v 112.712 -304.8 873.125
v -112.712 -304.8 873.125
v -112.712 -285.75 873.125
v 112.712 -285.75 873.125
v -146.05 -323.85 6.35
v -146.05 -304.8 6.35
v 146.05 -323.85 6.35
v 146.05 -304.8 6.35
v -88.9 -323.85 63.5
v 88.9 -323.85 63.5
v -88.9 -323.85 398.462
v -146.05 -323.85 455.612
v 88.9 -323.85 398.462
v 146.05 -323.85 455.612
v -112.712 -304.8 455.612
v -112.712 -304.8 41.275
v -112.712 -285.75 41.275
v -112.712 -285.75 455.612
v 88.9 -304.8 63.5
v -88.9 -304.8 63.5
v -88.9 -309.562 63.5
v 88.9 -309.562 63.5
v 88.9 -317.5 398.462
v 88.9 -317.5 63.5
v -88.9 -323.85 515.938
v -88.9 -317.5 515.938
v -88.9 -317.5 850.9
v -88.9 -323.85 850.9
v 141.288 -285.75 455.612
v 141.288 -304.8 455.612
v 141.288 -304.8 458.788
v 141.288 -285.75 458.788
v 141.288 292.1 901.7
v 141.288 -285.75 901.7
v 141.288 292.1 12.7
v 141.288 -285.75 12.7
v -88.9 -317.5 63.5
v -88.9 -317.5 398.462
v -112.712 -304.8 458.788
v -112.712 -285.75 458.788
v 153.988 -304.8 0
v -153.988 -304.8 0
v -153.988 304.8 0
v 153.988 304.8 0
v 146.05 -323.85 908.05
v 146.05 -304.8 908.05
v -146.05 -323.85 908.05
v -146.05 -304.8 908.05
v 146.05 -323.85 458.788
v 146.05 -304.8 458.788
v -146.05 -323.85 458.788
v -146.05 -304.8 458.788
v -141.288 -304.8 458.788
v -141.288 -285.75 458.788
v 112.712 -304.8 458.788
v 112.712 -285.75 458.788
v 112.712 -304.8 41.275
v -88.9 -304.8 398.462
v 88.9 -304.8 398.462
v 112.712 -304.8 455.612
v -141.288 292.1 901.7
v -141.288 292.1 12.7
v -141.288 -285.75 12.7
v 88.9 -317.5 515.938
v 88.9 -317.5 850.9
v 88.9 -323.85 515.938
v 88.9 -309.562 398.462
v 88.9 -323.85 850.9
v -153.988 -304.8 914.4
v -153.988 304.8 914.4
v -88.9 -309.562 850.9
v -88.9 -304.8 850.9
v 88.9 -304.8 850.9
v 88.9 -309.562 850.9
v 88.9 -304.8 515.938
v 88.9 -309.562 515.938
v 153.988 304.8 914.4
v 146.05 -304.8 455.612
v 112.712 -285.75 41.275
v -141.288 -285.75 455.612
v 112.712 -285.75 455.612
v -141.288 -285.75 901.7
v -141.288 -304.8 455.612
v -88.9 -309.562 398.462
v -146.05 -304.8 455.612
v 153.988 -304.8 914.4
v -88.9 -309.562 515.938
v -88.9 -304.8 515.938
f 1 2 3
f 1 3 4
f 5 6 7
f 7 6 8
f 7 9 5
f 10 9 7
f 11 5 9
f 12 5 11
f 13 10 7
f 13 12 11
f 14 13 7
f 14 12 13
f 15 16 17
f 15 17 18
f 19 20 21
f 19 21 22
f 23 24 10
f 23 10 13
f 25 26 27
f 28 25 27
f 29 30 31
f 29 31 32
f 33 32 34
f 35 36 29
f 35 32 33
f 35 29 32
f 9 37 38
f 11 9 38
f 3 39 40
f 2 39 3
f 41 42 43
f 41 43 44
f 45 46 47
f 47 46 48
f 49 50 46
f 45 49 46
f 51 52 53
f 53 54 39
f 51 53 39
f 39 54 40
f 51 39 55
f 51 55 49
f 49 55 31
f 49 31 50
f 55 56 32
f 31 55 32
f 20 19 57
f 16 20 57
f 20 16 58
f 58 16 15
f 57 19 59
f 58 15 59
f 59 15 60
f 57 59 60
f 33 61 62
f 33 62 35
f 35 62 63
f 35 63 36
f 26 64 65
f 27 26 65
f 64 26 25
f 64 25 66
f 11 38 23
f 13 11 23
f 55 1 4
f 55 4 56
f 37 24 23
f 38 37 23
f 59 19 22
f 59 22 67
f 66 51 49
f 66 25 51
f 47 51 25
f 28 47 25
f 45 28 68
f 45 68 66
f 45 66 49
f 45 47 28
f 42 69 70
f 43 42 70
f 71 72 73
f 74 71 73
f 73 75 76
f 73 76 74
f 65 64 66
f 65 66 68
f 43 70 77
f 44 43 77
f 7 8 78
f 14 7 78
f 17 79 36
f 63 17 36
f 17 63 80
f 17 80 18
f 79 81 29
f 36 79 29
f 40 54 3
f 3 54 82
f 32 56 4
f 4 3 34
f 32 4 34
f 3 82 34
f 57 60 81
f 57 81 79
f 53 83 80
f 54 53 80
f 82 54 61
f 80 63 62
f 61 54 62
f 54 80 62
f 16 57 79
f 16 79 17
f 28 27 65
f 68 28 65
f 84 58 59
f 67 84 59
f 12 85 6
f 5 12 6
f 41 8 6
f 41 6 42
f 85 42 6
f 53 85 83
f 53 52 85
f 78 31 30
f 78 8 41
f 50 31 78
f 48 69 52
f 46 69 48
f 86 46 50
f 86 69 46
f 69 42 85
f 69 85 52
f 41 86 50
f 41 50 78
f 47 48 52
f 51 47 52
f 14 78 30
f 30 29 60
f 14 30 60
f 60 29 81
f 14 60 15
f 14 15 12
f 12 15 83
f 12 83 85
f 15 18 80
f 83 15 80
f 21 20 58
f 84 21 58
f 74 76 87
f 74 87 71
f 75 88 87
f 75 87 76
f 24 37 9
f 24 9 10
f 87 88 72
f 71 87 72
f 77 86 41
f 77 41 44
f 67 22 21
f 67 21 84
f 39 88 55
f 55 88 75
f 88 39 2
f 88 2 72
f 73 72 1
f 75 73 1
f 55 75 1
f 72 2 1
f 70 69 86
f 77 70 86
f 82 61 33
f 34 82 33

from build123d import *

# Parameters (mm, degrees)
F0_W     = 307.975
F0_H     = 609.6
F1_DEPTH = 914.4
F2_T     = -12.7
F3_W     = 28.575
F3_H     = 19.05
F3_W_2   = 4.7625
F4_DEPTH = 19.05
F3_W_3   = 225.425
F3_H_2   = 395.2875
F3_W_4   = 177.8
F3_H_3   = 334.9625
F5_DEPTH = 19.05
F6_W     = 7.9375
F6_H     = 334.9625
F7_DEPTH = 177.8


with BuildPart() as f1:
    # F0 (on Top) → F1 (new body)
    with BuildSketch(Plane.XY):
        Rectangle(F0_W, F0_H)
    extrude(amount=F1_DEPTH)

    # F2
    f2_openings = [f1.faces().sort_by_distance(p)[0] for p in [
        (0, -304.8, 457.2),
    ]]
    offset(amount=F2_T, openings=f2_openings)

    # F3 (on face) → F4 (join)
    with BuildSketch(Plane.XZ.offset(304.8)):
        Polygon((-141.2875, 901.7), (-141.2875, 477.8375), (-112.7125, 477.8375), (-112.7125, 873.125), (112.7125, 873.125), (112.7125, 477.8375), (141.2875, 477.8375), (141.2875, 901.7), align=None)
        Polygon((-153.9875, 914.4), (-153.9875, 477.8375), (-146.05, 477.8375), (-146.05, 908.05), (146.05, 908.05), (146.05, 477.8375), (153.9875, 477.8375), (153.9875, 914.4), align=None)
        Polygon((-112.7125, 436.5625), (-141.2875, 436.5625), (-141.2875, 12.7), (141.2875, 12.7), (141.2875, 436.5625), (112.7125, 436.5625), (112.7125, 41.275), (-112.7125, 41.275), align=None)
        Polygon((-146.05, 436.5625), (-153.9875, 436.5625), (-153.9875, 0), (153.9875, 0), (153.9875, 436.5625), (146.05, 436.5625), (146.05, 6.35), (-146.05, 6.35), align=None)
        Polygon((-141.2875, 436.5625), (-146.05, 436.5625), (-146.05, 6.35), (146.05, 6.35), (146.05, 436.5625), (141.2875, 436.5625), (141.2875, 12.7), (-141.2875, 12.7), align=None)
        with Locations((-127, 446.0875)):
            Rectangle(F3_W, F3_H)
        Polygon((-153.9875, 477.8375), (-153.9875, 436.5625), (-146.05, 436.5625), (-146.05, 455.6125), (-141.2875, 455.6125), (-141.2875, 458.7875), (-146.05, 458.7875), (-146.05, 477.8375), align=None)
        with Locations((-143.66875, 446.0875)):
            Rectangle(F3_W_2, F3_H)
        with Locations((-127, 468.3125)):
            Rectangle(F3_W, F3_H)
        with Locations((127, 468.3125)):
            Rectangle(F3_W, F3_H)
        with Locations((127, 446.0875)):
            Rectangle(F3_W, F3_H)
        Polygon((146.05, 436.5625), (153.9875, 436.5625), (153.9875, 477.8375), (146.05, 477.8375), (146.05, 458.7875), (141.2875, 458.7875), (141.2875, 455.6125), (146.05, 455.6125), align=None)
        with Locations((143.66875, 446.0875)):
            Rectangle(F3_W_2, F3_H)
    extrude(amount=-F4_DEPTH)

    # F3 (on face) → F5 (join)
    with BuildSketch(Plane.XZ.offset(304.8)):
        Polygon((-112.7125, 436.5625), (-141.2875, 436.5625), (-141.2875, 12.7), (141.2875, 12.7), (141.2875, 436.5625), (112.7125, 436.5625), (112.7125, 41.275), (-112.7125, 41.275), align=None)
        Polygon((-141.2875, 436.5625), (-146.05, 436.5625), (-146.05, 6.35), (146.05, 6.35), (146.05, 436.5625), (141.2875, 436.5625), (141.2875, 12.7), (-141.2875, 12.7), align=None)
        with Locations((0, 238.91875)):
            Rectangle(F3_W_3, F3_H_2)
        with Locations((0, 230.98125)):
            Rectangle(F3_W_4, F3_H_3, mode=Mode.SUBTRACT)
        with Locations((0, 446.0875)):
            Rectangle(F3_W_3, F3_H)
        with Locations((-127, 446.0875)):
            Rectangle(F3_W, F3_H)
        with Locations((127, 446.0875)):
            Rectangle(F3_W, F3_H)
        with Locations((143.66875, 446.0875)):
            Rectangle(F3_W_2, F3_H)
        with Locations((-143.66875, 446.0875)):
            Rectangle(F3_W_2, F3_H)
        Polygon((-141.2875, 901.7), (-141.2875, 477.8375), (-112.7125, 477.8375), (-112.7125, 873.125), (112.7125, 873.125), (112.7125, 477.8375), (141.2875, 477.8375), (141.2875, 901.7), align=None)
        with Locations((0, 675.48125)):
            Rectangle(F3_W_3, F3_H_2)
        with Locations((0, 683.41875)):
            Rectangle(F3_W_4, F3_H_3, mode=Mode.SUBTRACT)
        with Locations((-127, 468.3125)):
            Rectangle(F3_W, F3_H)
        with Locations((0, 468.3125)):
            Rectangle(F3_W_3, F3_H)
        with Locations((127, 468.3125)):
            Rectangle(F3_W, F3_H)
        with Locations((143.66875, 468.3125)):
            Rectangle(F3_W_2, F3_H)
        Polygon((-146.05, 908.05), (-146.05, 477.8375), (-141.2875, 477.8375), (-141.2875, 901.7), (141.2875, 901.7), (141.2875, 477.8375), (146.05, 477.8375), (146.05, 908.05), align=None)
        with Locations((-143.66875, 468.3125)):
            Rectangle(F3_W_2, F3_H)
    extrude(amount=F5_DEPTH)

    # F6 (on face) → F7 (join, through all)
    with BuildSketch(Plane(origin=(88.9, 0, 0), x_dir=(0, -1, 0), z_dir=(-1, 0, 0))):
        with Locations((313.53125, 230.98125)):
            Rectangle(F6_W, F6_H)
        with Locations((313.53125, 683.41875)):
            Rectangle(F6_W, F6_H)
    extrude(amount=F7_DEPTH)


solid = f1.part
